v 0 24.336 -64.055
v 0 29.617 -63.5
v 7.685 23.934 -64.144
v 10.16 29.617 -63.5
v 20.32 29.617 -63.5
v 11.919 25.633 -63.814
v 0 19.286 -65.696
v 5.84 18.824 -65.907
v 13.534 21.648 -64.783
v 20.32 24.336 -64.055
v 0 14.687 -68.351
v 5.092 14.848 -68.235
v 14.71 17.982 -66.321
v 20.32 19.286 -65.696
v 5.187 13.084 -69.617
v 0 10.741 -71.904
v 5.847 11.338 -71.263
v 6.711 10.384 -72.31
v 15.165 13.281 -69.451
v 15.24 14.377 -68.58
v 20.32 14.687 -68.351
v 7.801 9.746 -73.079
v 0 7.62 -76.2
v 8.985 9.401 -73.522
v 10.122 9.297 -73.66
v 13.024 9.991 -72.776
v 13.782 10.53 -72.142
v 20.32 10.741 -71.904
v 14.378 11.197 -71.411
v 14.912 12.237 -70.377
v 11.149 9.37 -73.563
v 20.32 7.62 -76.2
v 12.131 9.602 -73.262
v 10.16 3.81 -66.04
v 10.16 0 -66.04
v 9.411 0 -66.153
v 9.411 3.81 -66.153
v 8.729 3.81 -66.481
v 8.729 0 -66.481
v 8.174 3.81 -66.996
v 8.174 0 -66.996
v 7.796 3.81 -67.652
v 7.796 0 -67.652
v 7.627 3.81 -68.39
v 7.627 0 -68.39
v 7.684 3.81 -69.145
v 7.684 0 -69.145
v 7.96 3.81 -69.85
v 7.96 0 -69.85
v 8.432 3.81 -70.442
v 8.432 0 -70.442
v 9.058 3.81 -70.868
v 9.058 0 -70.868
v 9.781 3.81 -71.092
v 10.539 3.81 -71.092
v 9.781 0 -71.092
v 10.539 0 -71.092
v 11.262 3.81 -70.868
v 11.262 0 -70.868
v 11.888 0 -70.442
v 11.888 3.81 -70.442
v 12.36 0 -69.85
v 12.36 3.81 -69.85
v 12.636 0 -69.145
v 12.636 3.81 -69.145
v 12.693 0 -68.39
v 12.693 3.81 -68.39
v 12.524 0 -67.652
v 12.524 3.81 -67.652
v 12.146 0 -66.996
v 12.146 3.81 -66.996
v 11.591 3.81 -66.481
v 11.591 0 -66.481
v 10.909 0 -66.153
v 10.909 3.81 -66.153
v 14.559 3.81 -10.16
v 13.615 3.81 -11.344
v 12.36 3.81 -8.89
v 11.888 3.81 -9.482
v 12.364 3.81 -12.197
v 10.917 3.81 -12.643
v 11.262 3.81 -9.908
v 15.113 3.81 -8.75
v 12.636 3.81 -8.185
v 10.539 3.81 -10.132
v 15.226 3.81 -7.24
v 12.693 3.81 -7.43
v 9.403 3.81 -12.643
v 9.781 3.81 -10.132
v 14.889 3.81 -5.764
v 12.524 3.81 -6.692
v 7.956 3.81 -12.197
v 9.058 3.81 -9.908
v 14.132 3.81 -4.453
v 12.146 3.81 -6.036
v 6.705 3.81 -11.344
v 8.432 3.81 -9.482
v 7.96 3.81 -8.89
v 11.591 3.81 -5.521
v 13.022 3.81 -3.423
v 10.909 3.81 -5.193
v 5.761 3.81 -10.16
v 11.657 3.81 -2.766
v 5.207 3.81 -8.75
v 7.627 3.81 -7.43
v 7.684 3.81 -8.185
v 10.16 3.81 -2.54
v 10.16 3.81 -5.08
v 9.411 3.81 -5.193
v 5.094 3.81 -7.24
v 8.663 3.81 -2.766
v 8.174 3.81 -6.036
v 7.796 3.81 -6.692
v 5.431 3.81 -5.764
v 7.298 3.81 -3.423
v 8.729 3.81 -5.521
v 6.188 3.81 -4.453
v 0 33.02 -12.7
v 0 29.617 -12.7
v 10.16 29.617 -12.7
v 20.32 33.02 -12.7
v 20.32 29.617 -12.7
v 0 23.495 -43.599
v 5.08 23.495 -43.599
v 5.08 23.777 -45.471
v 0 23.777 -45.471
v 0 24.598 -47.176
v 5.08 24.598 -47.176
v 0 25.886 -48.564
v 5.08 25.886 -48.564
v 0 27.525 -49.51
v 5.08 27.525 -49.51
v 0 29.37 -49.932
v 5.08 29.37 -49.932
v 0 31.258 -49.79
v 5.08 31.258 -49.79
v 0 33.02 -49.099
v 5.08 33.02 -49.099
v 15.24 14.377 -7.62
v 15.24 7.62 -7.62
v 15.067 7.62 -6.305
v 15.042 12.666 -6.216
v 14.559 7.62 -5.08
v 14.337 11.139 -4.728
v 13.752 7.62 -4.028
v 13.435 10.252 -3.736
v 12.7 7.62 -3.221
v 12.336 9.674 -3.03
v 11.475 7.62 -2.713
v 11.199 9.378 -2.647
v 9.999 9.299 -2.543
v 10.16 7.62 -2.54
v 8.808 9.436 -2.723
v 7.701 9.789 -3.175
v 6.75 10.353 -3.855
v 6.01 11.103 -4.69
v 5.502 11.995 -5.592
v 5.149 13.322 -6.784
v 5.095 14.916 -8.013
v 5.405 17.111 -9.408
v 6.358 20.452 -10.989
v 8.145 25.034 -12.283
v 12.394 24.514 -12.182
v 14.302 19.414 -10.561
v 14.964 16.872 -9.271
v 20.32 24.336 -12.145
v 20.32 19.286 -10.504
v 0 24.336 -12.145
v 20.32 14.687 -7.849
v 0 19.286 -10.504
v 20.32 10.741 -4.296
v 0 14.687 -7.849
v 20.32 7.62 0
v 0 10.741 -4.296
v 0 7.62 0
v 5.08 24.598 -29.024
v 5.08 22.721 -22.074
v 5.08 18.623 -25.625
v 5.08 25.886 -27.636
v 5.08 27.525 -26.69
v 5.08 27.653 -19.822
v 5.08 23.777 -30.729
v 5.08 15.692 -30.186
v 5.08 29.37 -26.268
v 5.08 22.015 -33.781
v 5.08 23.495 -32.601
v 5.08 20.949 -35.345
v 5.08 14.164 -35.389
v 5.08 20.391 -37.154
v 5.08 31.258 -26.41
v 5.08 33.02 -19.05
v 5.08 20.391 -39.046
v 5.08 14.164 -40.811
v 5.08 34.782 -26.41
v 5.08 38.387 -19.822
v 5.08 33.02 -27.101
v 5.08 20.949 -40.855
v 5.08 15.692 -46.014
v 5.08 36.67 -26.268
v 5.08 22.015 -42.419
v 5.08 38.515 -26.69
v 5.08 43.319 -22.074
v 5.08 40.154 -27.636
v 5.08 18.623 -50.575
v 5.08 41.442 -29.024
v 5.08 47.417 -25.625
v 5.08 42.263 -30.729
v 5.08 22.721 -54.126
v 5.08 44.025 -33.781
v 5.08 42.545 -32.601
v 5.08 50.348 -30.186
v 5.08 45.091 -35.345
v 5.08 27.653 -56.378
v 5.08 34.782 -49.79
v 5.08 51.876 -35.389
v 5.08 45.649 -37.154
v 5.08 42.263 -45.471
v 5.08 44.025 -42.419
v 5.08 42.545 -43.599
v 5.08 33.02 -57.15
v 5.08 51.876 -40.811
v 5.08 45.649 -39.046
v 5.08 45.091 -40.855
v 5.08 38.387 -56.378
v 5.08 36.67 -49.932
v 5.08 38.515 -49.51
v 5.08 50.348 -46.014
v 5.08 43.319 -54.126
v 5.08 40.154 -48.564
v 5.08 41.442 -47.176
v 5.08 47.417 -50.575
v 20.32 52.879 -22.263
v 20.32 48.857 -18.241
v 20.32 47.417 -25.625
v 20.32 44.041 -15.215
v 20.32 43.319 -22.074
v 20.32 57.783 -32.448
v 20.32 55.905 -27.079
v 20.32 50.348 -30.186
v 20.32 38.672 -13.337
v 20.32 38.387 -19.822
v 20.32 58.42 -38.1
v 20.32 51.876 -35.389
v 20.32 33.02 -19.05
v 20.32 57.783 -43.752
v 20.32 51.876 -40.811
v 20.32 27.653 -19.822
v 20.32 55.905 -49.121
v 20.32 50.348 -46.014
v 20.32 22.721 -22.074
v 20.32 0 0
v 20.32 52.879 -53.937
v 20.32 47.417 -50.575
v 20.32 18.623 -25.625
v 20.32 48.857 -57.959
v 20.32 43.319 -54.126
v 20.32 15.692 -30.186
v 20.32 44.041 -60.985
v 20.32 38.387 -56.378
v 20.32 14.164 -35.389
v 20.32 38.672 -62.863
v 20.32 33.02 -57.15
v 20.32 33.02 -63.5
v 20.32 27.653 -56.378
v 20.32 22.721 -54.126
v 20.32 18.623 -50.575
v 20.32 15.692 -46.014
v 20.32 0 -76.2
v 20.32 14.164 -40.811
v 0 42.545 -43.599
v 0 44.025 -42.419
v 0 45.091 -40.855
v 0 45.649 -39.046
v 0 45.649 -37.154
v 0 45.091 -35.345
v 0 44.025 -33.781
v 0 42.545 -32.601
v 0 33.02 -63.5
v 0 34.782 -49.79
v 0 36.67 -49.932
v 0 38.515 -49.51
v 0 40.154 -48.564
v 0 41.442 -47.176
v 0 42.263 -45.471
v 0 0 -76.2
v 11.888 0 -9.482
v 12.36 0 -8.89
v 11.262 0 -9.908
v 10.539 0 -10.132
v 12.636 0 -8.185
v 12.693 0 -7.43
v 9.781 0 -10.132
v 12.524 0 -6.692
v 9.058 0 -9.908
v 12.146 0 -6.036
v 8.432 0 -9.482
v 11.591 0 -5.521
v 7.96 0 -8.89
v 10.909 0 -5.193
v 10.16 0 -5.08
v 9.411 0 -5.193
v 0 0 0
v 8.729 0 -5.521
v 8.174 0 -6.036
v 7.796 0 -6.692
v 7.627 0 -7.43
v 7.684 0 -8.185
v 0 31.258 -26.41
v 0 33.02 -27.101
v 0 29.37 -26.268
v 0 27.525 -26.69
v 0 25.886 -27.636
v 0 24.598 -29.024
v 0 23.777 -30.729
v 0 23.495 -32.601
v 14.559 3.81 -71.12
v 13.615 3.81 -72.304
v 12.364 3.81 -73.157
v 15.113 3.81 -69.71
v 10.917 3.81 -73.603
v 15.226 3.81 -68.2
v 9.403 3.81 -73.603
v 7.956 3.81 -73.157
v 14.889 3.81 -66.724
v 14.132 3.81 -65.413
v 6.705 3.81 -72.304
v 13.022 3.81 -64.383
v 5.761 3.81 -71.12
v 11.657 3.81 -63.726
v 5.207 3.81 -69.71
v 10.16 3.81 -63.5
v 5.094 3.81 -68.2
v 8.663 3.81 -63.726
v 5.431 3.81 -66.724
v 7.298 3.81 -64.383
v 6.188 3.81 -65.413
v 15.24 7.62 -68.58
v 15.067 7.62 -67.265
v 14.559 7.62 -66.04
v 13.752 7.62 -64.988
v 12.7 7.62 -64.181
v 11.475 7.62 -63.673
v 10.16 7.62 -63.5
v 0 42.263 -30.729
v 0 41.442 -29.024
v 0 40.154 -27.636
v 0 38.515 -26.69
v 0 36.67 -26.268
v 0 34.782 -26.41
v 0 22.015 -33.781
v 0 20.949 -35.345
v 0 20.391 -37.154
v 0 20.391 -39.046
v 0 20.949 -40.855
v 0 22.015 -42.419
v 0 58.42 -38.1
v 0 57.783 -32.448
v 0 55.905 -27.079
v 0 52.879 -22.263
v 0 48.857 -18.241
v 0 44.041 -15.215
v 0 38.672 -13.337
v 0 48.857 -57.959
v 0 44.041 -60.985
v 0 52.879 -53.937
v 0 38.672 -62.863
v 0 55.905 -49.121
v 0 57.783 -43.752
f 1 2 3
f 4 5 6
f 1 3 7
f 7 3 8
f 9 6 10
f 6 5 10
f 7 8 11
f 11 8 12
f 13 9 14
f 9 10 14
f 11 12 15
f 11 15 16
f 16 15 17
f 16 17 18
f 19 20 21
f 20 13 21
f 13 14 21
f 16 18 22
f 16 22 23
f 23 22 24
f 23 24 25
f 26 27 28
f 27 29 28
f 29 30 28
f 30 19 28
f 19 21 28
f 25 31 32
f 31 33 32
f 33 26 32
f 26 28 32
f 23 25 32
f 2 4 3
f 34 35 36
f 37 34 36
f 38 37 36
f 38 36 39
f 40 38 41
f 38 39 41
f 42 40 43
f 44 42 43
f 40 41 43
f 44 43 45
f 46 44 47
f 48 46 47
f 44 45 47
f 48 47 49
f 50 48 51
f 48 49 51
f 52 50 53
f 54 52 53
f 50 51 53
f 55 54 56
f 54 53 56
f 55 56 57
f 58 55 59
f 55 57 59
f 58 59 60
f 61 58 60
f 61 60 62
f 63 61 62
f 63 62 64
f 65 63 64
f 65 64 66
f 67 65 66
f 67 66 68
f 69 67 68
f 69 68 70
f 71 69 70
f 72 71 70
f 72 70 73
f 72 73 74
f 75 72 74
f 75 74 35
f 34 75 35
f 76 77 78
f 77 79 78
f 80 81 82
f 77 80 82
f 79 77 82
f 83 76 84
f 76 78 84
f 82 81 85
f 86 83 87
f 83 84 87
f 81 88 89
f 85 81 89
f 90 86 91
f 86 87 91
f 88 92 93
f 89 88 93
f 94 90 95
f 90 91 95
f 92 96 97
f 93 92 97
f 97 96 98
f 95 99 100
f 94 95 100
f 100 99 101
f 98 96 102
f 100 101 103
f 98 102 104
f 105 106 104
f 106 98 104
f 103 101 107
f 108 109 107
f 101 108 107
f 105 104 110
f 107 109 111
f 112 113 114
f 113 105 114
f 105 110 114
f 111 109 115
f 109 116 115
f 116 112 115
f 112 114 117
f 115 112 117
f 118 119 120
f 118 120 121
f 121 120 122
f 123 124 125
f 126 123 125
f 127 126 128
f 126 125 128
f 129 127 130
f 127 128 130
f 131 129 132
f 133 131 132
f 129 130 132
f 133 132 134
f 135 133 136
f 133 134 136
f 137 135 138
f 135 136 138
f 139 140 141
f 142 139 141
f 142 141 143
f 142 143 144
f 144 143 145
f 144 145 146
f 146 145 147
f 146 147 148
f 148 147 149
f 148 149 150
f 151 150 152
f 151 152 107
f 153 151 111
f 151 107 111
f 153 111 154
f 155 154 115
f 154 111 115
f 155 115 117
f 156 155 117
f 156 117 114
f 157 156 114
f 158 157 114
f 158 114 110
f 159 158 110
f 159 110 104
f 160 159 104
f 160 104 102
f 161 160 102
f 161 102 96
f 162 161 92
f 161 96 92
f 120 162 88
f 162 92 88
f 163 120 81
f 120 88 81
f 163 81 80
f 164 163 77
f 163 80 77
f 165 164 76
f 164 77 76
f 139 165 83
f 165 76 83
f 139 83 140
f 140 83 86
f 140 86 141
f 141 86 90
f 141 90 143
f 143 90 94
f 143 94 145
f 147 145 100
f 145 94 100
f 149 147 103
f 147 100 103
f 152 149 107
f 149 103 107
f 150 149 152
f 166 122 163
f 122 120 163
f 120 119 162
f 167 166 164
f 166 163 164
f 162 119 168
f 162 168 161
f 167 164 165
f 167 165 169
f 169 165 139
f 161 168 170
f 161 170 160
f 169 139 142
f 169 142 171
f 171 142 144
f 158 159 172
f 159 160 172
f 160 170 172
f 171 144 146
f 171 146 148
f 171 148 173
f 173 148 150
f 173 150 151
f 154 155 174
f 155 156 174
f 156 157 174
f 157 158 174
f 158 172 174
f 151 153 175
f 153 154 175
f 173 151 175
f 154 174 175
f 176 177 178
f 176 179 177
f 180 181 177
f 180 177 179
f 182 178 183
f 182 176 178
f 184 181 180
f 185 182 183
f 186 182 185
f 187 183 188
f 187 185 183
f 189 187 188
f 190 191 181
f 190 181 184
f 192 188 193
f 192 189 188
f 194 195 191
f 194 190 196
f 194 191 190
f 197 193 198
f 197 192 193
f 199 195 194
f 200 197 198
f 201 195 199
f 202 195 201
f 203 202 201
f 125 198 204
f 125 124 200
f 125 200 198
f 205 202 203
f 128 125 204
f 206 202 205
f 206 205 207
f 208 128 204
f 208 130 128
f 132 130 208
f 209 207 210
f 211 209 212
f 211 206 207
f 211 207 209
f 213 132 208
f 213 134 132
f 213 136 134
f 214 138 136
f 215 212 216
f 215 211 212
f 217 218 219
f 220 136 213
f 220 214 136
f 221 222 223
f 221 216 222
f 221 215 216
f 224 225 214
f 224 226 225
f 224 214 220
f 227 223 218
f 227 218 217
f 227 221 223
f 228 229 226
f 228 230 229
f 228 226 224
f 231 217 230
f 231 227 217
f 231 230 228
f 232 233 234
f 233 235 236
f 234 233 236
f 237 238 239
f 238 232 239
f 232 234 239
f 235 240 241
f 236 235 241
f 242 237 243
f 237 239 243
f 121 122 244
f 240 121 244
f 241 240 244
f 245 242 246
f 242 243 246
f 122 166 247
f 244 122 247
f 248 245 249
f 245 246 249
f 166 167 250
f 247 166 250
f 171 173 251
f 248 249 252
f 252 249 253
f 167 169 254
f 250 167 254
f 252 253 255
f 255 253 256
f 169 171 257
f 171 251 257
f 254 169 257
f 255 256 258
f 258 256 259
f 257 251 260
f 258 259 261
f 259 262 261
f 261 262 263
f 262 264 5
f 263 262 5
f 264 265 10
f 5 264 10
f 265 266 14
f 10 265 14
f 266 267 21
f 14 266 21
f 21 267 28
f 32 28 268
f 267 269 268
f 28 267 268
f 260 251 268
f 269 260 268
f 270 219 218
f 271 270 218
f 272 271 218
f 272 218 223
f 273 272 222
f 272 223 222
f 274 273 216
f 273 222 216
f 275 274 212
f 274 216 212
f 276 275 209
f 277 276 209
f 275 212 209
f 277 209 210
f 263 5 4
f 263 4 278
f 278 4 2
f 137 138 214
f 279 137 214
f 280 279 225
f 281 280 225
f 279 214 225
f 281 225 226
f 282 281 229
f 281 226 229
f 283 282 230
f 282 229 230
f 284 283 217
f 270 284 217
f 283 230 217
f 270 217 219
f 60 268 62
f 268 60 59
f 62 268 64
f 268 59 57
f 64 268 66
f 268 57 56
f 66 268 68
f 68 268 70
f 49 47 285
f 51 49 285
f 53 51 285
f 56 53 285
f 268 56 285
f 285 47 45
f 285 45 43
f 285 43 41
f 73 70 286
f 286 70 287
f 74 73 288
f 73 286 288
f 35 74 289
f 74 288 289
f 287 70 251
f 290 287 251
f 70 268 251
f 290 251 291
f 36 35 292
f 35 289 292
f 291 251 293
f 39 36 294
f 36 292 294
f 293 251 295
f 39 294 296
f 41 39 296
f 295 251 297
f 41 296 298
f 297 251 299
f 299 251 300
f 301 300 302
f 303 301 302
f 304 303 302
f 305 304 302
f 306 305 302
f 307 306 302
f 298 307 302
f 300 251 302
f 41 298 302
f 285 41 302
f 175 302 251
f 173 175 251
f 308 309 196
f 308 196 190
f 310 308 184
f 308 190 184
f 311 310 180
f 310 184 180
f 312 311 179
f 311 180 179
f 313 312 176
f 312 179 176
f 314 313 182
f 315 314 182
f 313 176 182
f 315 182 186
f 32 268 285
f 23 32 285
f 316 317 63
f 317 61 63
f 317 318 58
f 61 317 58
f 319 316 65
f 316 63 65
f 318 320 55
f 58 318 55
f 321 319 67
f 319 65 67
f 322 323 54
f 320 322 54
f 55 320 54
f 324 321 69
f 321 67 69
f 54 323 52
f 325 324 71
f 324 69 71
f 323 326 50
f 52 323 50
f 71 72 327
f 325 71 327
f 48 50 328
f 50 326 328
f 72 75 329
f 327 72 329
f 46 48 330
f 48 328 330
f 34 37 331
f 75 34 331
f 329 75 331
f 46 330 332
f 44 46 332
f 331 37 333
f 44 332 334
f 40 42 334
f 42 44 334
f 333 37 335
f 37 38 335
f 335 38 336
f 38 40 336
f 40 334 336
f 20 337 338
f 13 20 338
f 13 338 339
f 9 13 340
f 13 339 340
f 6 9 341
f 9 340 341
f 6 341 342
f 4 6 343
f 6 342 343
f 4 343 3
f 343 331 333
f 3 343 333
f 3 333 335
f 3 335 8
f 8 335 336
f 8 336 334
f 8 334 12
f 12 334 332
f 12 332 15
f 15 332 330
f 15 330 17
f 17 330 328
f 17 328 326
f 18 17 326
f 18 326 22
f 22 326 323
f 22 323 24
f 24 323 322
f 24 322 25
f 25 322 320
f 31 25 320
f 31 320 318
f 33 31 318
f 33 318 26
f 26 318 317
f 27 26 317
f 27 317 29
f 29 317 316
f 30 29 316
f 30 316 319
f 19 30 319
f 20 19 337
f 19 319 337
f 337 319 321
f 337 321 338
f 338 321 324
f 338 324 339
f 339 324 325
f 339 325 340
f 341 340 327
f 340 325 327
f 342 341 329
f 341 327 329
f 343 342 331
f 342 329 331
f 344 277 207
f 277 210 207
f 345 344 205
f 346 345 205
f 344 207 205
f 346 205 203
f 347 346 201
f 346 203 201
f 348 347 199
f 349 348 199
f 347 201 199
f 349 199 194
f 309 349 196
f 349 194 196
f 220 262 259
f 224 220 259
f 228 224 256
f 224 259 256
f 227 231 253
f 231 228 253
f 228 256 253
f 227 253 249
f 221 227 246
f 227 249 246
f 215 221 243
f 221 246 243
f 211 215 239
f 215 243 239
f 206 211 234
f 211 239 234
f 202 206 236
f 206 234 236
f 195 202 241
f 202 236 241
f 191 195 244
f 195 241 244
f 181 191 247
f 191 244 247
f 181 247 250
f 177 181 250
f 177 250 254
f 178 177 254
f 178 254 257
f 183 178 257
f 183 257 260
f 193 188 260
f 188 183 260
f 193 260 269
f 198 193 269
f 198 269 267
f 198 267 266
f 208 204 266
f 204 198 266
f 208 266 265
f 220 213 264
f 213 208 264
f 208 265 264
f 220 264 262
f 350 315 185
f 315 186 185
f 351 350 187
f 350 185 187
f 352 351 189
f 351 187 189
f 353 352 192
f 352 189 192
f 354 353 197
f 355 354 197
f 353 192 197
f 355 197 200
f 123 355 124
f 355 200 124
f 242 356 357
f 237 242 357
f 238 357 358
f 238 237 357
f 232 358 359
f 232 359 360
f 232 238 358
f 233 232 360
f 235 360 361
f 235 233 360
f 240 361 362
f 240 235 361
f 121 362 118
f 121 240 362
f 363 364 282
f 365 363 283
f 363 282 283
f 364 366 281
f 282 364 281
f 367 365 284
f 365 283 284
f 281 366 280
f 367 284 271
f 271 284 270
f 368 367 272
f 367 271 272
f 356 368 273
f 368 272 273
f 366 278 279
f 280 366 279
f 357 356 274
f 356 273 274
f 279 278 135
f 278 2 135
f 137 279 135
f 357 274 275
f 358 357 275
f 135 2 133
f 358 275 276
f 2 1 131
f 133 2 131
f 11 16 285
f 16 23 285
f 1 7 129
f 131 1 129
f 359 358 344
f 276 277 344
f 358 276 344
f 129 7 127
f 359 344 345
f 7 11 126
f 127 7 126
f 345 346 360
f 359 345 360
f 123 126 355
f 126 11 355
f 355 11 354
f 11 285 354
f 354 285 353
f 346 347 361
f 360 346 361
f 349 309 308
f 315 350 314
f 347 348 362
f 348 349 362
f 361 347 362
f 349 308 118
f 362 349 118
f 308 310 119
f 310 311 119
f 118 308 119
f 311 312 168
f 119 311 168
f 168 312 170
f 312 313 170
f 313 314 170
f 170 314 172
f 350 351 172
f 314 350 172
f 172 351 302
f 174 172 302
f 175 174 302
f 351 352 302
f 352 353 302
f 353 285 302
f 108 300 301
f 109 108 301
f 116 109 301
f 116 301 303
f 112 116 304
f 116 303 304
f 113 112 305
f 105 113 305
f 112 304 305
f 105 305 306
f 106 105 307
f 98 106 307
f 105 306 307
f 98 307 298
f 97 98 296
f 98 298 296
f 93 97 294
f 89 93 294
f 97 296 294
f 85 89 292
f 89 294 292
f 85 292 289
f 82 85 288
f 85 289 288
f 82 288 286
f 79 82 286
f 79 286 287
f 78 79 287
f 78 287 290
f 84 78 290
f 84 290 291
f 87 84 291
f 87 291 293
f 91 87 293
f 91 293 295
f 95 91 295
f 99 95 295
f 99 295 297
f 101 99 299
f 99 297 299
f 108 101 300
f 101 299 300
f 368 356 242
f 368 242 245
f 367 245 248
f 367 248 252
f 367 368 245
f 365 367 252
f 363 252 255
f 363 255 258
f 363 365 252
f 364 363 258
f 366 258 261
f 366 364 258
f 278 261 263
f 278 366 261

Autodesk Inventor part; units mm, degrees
ref_plane "YZ Plane" through (0, 0, 0) normal (1, 0, 0) x (0, 1, 0)
ref_plane "XZ Plane" through (0, 0, 0) normal (0, 1, 0) x (-1, 0, 0)
ref_plane "XY Plane" through (0, 0, 0) normal (0, 0, 1) x (1, 0, 0)
sketch "Sketch1" plane through (0, 0, 0) normal (0, 1, 0) x (-1, 0, 0)
  line L0 (0, 0) -> (-20.32, 0)
  line L1 (-20.32, 0) -> (-20.32, -76.2)
  line L2 (-20.32, -76.2) -> (0, -76.2)
  line L3 (0, -76.2) -> (0, 0)
  dimension "d0" = 20.32
  dimension "d1" = 76.2
extrude "Extrusion1" add sketch "Sketch1" along normal blind 7.62
sketch "Sketch2" plane through (0, 7.62, 0) normal (0, 1, 0) x (1, 0, 0)
  line L0 (0, 0) -> (0, 12.7)
  line L1 (0, 76.2) -> (0, 0) projected
  line L2 (20.32, 0) -> (20.32, 76.2) projected
  line L3 (0, 12.7) -> (20.32, 12.7)
  line L4 (20.32, 12.7) -> (20.32, 63.5)
  line L5 (20.32, 63.5) -> (0, 63.5)
  line L6 (0, 63.5) -> (0, 12.7)
  dimension "d4" = 12.7
  dimension "d5" = 50.8
extrude "Extrusion2" add sketch "Sketch2" along normal blind 50.8
sketch "Sketch3" plane through (20.32, 0, 0) normal (1, 0, 0) x (0, 0, -1)
  line L0 (12.7, 58.42) -> (63.5, 58.42) projected
  line L1 (38.1, 58.42) -> (38.1, 33.02)
  circle A0 centre (38.1, 33.02) radius 19.05
  point P0 (0, 0)
  dimension "d8" = 25.4
  dimension "d9" = 38.1
extrude "Extrusion3" cut sketch "Sketch3" against normal blind 15.24
sketch "Sketch4" plane through (5.08, 33.02, -38.1) normal (1, 0, 0) x (0, 0, -1)
  circle A0 centre (0, 0) radius 19.05 projected
  line L0 (0, 19.05) -> (0, 12.7)
  line L1 (0, 12.7) -> (0, 6.35)
  circle A1 centre (0, 6.35) radius 6.35
  point P0 (-38.1, -33.02)
  dimension "d12" = 6.35
  dimension "d13" = 6.35
  dimension "d14" = 12.7
extrude "Extrusion4" cut sketch "Sketch4" against normal blind 5.08 contours A1
sketch "Sketch5" plane through (5.08, 33.02, -38.1) normal (1, 0, 0) x (0, 0, -1)
  circle A0 centre (0, 6.35) radius 6.35 projected
  point P0 (-38.1, -33.02)
  point P1 (0, 0)
pattern_circular "Circular Pattern1" count 6 over 360 about axis through (5.08, 33.02, -38.1) along (1, 0, 0) of "Extrusion4"
fillet "Fillet1" radius 25.4 1 edges at (10.16, 58.42, -12.7)
fillet "Fillet2" radius 25.4 1 edges at (10.16, 58.42, -63.5)
sketch "Sketch6" plane through (0, 7.62, 0) normal (0, 1, 0) x (1, 0, 0)
  line L0 (0, 12.7) -> (20.32, 12.7) projected
  line L1 (10.16, 12.7) -> (10.16, 2.54)
  line L2 (10.16, 12.7) -> (10.16, 7.62)
  line L3 (0, 63.5) -> (20.32, 63.5) projected
  line L4 (10.16, 63.5) -> (10.16, 68.58)
  circle A0 centre (10.16, 7.62) radius 2.54
  circle A1 centre (10.16, 68.58) radius 2.54
  point P0 (0, 0)
  dimension "d24" = 10.16
  dimension "d25" = 5.08
  dimension "d26" = 5.08
  dimension "d27" = 5.08
  dimension "d28" = 5.08
fillet "Fillet5" radius 25.4 2 edges at (10.16, 7.62, -63.5) (10.16, 7.62, -12.7)
hole "Hole1" at (10.16, 7.62, -7.62) at (10.16, 7.62, -68.58) direction (0, -1, 0) diameter 5.08 end through all counterbore diameter 10.16 counterbore depth 3.81
sketch "Sketch8" plane through (10.16, 7.62, -7.62) normal (0, -1, 0) x (1, 0, 0)
  circle A0 centre (0, 0) radius 5.08
  circle A1 centre (0, -60.96) radius 2.54 projected
  line L0 (-2.54, -60.96) -> (0, -60.96)
  circle A2 centre (0, -60.96) radius 5.08
  point P0 (-10.16, 7.62)
  dimension "d37" = 10.16
  dimension "d38" = 10.16
extrude "Extrusion5" cut sketch "Sketch8" against normal blind 25.4 contours A0 | A1 | A2
sketch "Sketch9" plane through (5.08, 33.02, -38.1) normal (1, 0, 0) x (0, 0, -1)
  arc A0 (5.4993, 9.525) -> (-5.4993, 9.525) centre (0, 6.35) ccw projected
  arc A1 (-5.4993, -9.525) -> (5.4993, -9.525) centre (0, -6.35) ccw projected
  point P0 (-38.1, -33.02)
  point P1 (0, 12.7)
  point P2 (0, -12.7)
properties part number "Motor Mount V1"
